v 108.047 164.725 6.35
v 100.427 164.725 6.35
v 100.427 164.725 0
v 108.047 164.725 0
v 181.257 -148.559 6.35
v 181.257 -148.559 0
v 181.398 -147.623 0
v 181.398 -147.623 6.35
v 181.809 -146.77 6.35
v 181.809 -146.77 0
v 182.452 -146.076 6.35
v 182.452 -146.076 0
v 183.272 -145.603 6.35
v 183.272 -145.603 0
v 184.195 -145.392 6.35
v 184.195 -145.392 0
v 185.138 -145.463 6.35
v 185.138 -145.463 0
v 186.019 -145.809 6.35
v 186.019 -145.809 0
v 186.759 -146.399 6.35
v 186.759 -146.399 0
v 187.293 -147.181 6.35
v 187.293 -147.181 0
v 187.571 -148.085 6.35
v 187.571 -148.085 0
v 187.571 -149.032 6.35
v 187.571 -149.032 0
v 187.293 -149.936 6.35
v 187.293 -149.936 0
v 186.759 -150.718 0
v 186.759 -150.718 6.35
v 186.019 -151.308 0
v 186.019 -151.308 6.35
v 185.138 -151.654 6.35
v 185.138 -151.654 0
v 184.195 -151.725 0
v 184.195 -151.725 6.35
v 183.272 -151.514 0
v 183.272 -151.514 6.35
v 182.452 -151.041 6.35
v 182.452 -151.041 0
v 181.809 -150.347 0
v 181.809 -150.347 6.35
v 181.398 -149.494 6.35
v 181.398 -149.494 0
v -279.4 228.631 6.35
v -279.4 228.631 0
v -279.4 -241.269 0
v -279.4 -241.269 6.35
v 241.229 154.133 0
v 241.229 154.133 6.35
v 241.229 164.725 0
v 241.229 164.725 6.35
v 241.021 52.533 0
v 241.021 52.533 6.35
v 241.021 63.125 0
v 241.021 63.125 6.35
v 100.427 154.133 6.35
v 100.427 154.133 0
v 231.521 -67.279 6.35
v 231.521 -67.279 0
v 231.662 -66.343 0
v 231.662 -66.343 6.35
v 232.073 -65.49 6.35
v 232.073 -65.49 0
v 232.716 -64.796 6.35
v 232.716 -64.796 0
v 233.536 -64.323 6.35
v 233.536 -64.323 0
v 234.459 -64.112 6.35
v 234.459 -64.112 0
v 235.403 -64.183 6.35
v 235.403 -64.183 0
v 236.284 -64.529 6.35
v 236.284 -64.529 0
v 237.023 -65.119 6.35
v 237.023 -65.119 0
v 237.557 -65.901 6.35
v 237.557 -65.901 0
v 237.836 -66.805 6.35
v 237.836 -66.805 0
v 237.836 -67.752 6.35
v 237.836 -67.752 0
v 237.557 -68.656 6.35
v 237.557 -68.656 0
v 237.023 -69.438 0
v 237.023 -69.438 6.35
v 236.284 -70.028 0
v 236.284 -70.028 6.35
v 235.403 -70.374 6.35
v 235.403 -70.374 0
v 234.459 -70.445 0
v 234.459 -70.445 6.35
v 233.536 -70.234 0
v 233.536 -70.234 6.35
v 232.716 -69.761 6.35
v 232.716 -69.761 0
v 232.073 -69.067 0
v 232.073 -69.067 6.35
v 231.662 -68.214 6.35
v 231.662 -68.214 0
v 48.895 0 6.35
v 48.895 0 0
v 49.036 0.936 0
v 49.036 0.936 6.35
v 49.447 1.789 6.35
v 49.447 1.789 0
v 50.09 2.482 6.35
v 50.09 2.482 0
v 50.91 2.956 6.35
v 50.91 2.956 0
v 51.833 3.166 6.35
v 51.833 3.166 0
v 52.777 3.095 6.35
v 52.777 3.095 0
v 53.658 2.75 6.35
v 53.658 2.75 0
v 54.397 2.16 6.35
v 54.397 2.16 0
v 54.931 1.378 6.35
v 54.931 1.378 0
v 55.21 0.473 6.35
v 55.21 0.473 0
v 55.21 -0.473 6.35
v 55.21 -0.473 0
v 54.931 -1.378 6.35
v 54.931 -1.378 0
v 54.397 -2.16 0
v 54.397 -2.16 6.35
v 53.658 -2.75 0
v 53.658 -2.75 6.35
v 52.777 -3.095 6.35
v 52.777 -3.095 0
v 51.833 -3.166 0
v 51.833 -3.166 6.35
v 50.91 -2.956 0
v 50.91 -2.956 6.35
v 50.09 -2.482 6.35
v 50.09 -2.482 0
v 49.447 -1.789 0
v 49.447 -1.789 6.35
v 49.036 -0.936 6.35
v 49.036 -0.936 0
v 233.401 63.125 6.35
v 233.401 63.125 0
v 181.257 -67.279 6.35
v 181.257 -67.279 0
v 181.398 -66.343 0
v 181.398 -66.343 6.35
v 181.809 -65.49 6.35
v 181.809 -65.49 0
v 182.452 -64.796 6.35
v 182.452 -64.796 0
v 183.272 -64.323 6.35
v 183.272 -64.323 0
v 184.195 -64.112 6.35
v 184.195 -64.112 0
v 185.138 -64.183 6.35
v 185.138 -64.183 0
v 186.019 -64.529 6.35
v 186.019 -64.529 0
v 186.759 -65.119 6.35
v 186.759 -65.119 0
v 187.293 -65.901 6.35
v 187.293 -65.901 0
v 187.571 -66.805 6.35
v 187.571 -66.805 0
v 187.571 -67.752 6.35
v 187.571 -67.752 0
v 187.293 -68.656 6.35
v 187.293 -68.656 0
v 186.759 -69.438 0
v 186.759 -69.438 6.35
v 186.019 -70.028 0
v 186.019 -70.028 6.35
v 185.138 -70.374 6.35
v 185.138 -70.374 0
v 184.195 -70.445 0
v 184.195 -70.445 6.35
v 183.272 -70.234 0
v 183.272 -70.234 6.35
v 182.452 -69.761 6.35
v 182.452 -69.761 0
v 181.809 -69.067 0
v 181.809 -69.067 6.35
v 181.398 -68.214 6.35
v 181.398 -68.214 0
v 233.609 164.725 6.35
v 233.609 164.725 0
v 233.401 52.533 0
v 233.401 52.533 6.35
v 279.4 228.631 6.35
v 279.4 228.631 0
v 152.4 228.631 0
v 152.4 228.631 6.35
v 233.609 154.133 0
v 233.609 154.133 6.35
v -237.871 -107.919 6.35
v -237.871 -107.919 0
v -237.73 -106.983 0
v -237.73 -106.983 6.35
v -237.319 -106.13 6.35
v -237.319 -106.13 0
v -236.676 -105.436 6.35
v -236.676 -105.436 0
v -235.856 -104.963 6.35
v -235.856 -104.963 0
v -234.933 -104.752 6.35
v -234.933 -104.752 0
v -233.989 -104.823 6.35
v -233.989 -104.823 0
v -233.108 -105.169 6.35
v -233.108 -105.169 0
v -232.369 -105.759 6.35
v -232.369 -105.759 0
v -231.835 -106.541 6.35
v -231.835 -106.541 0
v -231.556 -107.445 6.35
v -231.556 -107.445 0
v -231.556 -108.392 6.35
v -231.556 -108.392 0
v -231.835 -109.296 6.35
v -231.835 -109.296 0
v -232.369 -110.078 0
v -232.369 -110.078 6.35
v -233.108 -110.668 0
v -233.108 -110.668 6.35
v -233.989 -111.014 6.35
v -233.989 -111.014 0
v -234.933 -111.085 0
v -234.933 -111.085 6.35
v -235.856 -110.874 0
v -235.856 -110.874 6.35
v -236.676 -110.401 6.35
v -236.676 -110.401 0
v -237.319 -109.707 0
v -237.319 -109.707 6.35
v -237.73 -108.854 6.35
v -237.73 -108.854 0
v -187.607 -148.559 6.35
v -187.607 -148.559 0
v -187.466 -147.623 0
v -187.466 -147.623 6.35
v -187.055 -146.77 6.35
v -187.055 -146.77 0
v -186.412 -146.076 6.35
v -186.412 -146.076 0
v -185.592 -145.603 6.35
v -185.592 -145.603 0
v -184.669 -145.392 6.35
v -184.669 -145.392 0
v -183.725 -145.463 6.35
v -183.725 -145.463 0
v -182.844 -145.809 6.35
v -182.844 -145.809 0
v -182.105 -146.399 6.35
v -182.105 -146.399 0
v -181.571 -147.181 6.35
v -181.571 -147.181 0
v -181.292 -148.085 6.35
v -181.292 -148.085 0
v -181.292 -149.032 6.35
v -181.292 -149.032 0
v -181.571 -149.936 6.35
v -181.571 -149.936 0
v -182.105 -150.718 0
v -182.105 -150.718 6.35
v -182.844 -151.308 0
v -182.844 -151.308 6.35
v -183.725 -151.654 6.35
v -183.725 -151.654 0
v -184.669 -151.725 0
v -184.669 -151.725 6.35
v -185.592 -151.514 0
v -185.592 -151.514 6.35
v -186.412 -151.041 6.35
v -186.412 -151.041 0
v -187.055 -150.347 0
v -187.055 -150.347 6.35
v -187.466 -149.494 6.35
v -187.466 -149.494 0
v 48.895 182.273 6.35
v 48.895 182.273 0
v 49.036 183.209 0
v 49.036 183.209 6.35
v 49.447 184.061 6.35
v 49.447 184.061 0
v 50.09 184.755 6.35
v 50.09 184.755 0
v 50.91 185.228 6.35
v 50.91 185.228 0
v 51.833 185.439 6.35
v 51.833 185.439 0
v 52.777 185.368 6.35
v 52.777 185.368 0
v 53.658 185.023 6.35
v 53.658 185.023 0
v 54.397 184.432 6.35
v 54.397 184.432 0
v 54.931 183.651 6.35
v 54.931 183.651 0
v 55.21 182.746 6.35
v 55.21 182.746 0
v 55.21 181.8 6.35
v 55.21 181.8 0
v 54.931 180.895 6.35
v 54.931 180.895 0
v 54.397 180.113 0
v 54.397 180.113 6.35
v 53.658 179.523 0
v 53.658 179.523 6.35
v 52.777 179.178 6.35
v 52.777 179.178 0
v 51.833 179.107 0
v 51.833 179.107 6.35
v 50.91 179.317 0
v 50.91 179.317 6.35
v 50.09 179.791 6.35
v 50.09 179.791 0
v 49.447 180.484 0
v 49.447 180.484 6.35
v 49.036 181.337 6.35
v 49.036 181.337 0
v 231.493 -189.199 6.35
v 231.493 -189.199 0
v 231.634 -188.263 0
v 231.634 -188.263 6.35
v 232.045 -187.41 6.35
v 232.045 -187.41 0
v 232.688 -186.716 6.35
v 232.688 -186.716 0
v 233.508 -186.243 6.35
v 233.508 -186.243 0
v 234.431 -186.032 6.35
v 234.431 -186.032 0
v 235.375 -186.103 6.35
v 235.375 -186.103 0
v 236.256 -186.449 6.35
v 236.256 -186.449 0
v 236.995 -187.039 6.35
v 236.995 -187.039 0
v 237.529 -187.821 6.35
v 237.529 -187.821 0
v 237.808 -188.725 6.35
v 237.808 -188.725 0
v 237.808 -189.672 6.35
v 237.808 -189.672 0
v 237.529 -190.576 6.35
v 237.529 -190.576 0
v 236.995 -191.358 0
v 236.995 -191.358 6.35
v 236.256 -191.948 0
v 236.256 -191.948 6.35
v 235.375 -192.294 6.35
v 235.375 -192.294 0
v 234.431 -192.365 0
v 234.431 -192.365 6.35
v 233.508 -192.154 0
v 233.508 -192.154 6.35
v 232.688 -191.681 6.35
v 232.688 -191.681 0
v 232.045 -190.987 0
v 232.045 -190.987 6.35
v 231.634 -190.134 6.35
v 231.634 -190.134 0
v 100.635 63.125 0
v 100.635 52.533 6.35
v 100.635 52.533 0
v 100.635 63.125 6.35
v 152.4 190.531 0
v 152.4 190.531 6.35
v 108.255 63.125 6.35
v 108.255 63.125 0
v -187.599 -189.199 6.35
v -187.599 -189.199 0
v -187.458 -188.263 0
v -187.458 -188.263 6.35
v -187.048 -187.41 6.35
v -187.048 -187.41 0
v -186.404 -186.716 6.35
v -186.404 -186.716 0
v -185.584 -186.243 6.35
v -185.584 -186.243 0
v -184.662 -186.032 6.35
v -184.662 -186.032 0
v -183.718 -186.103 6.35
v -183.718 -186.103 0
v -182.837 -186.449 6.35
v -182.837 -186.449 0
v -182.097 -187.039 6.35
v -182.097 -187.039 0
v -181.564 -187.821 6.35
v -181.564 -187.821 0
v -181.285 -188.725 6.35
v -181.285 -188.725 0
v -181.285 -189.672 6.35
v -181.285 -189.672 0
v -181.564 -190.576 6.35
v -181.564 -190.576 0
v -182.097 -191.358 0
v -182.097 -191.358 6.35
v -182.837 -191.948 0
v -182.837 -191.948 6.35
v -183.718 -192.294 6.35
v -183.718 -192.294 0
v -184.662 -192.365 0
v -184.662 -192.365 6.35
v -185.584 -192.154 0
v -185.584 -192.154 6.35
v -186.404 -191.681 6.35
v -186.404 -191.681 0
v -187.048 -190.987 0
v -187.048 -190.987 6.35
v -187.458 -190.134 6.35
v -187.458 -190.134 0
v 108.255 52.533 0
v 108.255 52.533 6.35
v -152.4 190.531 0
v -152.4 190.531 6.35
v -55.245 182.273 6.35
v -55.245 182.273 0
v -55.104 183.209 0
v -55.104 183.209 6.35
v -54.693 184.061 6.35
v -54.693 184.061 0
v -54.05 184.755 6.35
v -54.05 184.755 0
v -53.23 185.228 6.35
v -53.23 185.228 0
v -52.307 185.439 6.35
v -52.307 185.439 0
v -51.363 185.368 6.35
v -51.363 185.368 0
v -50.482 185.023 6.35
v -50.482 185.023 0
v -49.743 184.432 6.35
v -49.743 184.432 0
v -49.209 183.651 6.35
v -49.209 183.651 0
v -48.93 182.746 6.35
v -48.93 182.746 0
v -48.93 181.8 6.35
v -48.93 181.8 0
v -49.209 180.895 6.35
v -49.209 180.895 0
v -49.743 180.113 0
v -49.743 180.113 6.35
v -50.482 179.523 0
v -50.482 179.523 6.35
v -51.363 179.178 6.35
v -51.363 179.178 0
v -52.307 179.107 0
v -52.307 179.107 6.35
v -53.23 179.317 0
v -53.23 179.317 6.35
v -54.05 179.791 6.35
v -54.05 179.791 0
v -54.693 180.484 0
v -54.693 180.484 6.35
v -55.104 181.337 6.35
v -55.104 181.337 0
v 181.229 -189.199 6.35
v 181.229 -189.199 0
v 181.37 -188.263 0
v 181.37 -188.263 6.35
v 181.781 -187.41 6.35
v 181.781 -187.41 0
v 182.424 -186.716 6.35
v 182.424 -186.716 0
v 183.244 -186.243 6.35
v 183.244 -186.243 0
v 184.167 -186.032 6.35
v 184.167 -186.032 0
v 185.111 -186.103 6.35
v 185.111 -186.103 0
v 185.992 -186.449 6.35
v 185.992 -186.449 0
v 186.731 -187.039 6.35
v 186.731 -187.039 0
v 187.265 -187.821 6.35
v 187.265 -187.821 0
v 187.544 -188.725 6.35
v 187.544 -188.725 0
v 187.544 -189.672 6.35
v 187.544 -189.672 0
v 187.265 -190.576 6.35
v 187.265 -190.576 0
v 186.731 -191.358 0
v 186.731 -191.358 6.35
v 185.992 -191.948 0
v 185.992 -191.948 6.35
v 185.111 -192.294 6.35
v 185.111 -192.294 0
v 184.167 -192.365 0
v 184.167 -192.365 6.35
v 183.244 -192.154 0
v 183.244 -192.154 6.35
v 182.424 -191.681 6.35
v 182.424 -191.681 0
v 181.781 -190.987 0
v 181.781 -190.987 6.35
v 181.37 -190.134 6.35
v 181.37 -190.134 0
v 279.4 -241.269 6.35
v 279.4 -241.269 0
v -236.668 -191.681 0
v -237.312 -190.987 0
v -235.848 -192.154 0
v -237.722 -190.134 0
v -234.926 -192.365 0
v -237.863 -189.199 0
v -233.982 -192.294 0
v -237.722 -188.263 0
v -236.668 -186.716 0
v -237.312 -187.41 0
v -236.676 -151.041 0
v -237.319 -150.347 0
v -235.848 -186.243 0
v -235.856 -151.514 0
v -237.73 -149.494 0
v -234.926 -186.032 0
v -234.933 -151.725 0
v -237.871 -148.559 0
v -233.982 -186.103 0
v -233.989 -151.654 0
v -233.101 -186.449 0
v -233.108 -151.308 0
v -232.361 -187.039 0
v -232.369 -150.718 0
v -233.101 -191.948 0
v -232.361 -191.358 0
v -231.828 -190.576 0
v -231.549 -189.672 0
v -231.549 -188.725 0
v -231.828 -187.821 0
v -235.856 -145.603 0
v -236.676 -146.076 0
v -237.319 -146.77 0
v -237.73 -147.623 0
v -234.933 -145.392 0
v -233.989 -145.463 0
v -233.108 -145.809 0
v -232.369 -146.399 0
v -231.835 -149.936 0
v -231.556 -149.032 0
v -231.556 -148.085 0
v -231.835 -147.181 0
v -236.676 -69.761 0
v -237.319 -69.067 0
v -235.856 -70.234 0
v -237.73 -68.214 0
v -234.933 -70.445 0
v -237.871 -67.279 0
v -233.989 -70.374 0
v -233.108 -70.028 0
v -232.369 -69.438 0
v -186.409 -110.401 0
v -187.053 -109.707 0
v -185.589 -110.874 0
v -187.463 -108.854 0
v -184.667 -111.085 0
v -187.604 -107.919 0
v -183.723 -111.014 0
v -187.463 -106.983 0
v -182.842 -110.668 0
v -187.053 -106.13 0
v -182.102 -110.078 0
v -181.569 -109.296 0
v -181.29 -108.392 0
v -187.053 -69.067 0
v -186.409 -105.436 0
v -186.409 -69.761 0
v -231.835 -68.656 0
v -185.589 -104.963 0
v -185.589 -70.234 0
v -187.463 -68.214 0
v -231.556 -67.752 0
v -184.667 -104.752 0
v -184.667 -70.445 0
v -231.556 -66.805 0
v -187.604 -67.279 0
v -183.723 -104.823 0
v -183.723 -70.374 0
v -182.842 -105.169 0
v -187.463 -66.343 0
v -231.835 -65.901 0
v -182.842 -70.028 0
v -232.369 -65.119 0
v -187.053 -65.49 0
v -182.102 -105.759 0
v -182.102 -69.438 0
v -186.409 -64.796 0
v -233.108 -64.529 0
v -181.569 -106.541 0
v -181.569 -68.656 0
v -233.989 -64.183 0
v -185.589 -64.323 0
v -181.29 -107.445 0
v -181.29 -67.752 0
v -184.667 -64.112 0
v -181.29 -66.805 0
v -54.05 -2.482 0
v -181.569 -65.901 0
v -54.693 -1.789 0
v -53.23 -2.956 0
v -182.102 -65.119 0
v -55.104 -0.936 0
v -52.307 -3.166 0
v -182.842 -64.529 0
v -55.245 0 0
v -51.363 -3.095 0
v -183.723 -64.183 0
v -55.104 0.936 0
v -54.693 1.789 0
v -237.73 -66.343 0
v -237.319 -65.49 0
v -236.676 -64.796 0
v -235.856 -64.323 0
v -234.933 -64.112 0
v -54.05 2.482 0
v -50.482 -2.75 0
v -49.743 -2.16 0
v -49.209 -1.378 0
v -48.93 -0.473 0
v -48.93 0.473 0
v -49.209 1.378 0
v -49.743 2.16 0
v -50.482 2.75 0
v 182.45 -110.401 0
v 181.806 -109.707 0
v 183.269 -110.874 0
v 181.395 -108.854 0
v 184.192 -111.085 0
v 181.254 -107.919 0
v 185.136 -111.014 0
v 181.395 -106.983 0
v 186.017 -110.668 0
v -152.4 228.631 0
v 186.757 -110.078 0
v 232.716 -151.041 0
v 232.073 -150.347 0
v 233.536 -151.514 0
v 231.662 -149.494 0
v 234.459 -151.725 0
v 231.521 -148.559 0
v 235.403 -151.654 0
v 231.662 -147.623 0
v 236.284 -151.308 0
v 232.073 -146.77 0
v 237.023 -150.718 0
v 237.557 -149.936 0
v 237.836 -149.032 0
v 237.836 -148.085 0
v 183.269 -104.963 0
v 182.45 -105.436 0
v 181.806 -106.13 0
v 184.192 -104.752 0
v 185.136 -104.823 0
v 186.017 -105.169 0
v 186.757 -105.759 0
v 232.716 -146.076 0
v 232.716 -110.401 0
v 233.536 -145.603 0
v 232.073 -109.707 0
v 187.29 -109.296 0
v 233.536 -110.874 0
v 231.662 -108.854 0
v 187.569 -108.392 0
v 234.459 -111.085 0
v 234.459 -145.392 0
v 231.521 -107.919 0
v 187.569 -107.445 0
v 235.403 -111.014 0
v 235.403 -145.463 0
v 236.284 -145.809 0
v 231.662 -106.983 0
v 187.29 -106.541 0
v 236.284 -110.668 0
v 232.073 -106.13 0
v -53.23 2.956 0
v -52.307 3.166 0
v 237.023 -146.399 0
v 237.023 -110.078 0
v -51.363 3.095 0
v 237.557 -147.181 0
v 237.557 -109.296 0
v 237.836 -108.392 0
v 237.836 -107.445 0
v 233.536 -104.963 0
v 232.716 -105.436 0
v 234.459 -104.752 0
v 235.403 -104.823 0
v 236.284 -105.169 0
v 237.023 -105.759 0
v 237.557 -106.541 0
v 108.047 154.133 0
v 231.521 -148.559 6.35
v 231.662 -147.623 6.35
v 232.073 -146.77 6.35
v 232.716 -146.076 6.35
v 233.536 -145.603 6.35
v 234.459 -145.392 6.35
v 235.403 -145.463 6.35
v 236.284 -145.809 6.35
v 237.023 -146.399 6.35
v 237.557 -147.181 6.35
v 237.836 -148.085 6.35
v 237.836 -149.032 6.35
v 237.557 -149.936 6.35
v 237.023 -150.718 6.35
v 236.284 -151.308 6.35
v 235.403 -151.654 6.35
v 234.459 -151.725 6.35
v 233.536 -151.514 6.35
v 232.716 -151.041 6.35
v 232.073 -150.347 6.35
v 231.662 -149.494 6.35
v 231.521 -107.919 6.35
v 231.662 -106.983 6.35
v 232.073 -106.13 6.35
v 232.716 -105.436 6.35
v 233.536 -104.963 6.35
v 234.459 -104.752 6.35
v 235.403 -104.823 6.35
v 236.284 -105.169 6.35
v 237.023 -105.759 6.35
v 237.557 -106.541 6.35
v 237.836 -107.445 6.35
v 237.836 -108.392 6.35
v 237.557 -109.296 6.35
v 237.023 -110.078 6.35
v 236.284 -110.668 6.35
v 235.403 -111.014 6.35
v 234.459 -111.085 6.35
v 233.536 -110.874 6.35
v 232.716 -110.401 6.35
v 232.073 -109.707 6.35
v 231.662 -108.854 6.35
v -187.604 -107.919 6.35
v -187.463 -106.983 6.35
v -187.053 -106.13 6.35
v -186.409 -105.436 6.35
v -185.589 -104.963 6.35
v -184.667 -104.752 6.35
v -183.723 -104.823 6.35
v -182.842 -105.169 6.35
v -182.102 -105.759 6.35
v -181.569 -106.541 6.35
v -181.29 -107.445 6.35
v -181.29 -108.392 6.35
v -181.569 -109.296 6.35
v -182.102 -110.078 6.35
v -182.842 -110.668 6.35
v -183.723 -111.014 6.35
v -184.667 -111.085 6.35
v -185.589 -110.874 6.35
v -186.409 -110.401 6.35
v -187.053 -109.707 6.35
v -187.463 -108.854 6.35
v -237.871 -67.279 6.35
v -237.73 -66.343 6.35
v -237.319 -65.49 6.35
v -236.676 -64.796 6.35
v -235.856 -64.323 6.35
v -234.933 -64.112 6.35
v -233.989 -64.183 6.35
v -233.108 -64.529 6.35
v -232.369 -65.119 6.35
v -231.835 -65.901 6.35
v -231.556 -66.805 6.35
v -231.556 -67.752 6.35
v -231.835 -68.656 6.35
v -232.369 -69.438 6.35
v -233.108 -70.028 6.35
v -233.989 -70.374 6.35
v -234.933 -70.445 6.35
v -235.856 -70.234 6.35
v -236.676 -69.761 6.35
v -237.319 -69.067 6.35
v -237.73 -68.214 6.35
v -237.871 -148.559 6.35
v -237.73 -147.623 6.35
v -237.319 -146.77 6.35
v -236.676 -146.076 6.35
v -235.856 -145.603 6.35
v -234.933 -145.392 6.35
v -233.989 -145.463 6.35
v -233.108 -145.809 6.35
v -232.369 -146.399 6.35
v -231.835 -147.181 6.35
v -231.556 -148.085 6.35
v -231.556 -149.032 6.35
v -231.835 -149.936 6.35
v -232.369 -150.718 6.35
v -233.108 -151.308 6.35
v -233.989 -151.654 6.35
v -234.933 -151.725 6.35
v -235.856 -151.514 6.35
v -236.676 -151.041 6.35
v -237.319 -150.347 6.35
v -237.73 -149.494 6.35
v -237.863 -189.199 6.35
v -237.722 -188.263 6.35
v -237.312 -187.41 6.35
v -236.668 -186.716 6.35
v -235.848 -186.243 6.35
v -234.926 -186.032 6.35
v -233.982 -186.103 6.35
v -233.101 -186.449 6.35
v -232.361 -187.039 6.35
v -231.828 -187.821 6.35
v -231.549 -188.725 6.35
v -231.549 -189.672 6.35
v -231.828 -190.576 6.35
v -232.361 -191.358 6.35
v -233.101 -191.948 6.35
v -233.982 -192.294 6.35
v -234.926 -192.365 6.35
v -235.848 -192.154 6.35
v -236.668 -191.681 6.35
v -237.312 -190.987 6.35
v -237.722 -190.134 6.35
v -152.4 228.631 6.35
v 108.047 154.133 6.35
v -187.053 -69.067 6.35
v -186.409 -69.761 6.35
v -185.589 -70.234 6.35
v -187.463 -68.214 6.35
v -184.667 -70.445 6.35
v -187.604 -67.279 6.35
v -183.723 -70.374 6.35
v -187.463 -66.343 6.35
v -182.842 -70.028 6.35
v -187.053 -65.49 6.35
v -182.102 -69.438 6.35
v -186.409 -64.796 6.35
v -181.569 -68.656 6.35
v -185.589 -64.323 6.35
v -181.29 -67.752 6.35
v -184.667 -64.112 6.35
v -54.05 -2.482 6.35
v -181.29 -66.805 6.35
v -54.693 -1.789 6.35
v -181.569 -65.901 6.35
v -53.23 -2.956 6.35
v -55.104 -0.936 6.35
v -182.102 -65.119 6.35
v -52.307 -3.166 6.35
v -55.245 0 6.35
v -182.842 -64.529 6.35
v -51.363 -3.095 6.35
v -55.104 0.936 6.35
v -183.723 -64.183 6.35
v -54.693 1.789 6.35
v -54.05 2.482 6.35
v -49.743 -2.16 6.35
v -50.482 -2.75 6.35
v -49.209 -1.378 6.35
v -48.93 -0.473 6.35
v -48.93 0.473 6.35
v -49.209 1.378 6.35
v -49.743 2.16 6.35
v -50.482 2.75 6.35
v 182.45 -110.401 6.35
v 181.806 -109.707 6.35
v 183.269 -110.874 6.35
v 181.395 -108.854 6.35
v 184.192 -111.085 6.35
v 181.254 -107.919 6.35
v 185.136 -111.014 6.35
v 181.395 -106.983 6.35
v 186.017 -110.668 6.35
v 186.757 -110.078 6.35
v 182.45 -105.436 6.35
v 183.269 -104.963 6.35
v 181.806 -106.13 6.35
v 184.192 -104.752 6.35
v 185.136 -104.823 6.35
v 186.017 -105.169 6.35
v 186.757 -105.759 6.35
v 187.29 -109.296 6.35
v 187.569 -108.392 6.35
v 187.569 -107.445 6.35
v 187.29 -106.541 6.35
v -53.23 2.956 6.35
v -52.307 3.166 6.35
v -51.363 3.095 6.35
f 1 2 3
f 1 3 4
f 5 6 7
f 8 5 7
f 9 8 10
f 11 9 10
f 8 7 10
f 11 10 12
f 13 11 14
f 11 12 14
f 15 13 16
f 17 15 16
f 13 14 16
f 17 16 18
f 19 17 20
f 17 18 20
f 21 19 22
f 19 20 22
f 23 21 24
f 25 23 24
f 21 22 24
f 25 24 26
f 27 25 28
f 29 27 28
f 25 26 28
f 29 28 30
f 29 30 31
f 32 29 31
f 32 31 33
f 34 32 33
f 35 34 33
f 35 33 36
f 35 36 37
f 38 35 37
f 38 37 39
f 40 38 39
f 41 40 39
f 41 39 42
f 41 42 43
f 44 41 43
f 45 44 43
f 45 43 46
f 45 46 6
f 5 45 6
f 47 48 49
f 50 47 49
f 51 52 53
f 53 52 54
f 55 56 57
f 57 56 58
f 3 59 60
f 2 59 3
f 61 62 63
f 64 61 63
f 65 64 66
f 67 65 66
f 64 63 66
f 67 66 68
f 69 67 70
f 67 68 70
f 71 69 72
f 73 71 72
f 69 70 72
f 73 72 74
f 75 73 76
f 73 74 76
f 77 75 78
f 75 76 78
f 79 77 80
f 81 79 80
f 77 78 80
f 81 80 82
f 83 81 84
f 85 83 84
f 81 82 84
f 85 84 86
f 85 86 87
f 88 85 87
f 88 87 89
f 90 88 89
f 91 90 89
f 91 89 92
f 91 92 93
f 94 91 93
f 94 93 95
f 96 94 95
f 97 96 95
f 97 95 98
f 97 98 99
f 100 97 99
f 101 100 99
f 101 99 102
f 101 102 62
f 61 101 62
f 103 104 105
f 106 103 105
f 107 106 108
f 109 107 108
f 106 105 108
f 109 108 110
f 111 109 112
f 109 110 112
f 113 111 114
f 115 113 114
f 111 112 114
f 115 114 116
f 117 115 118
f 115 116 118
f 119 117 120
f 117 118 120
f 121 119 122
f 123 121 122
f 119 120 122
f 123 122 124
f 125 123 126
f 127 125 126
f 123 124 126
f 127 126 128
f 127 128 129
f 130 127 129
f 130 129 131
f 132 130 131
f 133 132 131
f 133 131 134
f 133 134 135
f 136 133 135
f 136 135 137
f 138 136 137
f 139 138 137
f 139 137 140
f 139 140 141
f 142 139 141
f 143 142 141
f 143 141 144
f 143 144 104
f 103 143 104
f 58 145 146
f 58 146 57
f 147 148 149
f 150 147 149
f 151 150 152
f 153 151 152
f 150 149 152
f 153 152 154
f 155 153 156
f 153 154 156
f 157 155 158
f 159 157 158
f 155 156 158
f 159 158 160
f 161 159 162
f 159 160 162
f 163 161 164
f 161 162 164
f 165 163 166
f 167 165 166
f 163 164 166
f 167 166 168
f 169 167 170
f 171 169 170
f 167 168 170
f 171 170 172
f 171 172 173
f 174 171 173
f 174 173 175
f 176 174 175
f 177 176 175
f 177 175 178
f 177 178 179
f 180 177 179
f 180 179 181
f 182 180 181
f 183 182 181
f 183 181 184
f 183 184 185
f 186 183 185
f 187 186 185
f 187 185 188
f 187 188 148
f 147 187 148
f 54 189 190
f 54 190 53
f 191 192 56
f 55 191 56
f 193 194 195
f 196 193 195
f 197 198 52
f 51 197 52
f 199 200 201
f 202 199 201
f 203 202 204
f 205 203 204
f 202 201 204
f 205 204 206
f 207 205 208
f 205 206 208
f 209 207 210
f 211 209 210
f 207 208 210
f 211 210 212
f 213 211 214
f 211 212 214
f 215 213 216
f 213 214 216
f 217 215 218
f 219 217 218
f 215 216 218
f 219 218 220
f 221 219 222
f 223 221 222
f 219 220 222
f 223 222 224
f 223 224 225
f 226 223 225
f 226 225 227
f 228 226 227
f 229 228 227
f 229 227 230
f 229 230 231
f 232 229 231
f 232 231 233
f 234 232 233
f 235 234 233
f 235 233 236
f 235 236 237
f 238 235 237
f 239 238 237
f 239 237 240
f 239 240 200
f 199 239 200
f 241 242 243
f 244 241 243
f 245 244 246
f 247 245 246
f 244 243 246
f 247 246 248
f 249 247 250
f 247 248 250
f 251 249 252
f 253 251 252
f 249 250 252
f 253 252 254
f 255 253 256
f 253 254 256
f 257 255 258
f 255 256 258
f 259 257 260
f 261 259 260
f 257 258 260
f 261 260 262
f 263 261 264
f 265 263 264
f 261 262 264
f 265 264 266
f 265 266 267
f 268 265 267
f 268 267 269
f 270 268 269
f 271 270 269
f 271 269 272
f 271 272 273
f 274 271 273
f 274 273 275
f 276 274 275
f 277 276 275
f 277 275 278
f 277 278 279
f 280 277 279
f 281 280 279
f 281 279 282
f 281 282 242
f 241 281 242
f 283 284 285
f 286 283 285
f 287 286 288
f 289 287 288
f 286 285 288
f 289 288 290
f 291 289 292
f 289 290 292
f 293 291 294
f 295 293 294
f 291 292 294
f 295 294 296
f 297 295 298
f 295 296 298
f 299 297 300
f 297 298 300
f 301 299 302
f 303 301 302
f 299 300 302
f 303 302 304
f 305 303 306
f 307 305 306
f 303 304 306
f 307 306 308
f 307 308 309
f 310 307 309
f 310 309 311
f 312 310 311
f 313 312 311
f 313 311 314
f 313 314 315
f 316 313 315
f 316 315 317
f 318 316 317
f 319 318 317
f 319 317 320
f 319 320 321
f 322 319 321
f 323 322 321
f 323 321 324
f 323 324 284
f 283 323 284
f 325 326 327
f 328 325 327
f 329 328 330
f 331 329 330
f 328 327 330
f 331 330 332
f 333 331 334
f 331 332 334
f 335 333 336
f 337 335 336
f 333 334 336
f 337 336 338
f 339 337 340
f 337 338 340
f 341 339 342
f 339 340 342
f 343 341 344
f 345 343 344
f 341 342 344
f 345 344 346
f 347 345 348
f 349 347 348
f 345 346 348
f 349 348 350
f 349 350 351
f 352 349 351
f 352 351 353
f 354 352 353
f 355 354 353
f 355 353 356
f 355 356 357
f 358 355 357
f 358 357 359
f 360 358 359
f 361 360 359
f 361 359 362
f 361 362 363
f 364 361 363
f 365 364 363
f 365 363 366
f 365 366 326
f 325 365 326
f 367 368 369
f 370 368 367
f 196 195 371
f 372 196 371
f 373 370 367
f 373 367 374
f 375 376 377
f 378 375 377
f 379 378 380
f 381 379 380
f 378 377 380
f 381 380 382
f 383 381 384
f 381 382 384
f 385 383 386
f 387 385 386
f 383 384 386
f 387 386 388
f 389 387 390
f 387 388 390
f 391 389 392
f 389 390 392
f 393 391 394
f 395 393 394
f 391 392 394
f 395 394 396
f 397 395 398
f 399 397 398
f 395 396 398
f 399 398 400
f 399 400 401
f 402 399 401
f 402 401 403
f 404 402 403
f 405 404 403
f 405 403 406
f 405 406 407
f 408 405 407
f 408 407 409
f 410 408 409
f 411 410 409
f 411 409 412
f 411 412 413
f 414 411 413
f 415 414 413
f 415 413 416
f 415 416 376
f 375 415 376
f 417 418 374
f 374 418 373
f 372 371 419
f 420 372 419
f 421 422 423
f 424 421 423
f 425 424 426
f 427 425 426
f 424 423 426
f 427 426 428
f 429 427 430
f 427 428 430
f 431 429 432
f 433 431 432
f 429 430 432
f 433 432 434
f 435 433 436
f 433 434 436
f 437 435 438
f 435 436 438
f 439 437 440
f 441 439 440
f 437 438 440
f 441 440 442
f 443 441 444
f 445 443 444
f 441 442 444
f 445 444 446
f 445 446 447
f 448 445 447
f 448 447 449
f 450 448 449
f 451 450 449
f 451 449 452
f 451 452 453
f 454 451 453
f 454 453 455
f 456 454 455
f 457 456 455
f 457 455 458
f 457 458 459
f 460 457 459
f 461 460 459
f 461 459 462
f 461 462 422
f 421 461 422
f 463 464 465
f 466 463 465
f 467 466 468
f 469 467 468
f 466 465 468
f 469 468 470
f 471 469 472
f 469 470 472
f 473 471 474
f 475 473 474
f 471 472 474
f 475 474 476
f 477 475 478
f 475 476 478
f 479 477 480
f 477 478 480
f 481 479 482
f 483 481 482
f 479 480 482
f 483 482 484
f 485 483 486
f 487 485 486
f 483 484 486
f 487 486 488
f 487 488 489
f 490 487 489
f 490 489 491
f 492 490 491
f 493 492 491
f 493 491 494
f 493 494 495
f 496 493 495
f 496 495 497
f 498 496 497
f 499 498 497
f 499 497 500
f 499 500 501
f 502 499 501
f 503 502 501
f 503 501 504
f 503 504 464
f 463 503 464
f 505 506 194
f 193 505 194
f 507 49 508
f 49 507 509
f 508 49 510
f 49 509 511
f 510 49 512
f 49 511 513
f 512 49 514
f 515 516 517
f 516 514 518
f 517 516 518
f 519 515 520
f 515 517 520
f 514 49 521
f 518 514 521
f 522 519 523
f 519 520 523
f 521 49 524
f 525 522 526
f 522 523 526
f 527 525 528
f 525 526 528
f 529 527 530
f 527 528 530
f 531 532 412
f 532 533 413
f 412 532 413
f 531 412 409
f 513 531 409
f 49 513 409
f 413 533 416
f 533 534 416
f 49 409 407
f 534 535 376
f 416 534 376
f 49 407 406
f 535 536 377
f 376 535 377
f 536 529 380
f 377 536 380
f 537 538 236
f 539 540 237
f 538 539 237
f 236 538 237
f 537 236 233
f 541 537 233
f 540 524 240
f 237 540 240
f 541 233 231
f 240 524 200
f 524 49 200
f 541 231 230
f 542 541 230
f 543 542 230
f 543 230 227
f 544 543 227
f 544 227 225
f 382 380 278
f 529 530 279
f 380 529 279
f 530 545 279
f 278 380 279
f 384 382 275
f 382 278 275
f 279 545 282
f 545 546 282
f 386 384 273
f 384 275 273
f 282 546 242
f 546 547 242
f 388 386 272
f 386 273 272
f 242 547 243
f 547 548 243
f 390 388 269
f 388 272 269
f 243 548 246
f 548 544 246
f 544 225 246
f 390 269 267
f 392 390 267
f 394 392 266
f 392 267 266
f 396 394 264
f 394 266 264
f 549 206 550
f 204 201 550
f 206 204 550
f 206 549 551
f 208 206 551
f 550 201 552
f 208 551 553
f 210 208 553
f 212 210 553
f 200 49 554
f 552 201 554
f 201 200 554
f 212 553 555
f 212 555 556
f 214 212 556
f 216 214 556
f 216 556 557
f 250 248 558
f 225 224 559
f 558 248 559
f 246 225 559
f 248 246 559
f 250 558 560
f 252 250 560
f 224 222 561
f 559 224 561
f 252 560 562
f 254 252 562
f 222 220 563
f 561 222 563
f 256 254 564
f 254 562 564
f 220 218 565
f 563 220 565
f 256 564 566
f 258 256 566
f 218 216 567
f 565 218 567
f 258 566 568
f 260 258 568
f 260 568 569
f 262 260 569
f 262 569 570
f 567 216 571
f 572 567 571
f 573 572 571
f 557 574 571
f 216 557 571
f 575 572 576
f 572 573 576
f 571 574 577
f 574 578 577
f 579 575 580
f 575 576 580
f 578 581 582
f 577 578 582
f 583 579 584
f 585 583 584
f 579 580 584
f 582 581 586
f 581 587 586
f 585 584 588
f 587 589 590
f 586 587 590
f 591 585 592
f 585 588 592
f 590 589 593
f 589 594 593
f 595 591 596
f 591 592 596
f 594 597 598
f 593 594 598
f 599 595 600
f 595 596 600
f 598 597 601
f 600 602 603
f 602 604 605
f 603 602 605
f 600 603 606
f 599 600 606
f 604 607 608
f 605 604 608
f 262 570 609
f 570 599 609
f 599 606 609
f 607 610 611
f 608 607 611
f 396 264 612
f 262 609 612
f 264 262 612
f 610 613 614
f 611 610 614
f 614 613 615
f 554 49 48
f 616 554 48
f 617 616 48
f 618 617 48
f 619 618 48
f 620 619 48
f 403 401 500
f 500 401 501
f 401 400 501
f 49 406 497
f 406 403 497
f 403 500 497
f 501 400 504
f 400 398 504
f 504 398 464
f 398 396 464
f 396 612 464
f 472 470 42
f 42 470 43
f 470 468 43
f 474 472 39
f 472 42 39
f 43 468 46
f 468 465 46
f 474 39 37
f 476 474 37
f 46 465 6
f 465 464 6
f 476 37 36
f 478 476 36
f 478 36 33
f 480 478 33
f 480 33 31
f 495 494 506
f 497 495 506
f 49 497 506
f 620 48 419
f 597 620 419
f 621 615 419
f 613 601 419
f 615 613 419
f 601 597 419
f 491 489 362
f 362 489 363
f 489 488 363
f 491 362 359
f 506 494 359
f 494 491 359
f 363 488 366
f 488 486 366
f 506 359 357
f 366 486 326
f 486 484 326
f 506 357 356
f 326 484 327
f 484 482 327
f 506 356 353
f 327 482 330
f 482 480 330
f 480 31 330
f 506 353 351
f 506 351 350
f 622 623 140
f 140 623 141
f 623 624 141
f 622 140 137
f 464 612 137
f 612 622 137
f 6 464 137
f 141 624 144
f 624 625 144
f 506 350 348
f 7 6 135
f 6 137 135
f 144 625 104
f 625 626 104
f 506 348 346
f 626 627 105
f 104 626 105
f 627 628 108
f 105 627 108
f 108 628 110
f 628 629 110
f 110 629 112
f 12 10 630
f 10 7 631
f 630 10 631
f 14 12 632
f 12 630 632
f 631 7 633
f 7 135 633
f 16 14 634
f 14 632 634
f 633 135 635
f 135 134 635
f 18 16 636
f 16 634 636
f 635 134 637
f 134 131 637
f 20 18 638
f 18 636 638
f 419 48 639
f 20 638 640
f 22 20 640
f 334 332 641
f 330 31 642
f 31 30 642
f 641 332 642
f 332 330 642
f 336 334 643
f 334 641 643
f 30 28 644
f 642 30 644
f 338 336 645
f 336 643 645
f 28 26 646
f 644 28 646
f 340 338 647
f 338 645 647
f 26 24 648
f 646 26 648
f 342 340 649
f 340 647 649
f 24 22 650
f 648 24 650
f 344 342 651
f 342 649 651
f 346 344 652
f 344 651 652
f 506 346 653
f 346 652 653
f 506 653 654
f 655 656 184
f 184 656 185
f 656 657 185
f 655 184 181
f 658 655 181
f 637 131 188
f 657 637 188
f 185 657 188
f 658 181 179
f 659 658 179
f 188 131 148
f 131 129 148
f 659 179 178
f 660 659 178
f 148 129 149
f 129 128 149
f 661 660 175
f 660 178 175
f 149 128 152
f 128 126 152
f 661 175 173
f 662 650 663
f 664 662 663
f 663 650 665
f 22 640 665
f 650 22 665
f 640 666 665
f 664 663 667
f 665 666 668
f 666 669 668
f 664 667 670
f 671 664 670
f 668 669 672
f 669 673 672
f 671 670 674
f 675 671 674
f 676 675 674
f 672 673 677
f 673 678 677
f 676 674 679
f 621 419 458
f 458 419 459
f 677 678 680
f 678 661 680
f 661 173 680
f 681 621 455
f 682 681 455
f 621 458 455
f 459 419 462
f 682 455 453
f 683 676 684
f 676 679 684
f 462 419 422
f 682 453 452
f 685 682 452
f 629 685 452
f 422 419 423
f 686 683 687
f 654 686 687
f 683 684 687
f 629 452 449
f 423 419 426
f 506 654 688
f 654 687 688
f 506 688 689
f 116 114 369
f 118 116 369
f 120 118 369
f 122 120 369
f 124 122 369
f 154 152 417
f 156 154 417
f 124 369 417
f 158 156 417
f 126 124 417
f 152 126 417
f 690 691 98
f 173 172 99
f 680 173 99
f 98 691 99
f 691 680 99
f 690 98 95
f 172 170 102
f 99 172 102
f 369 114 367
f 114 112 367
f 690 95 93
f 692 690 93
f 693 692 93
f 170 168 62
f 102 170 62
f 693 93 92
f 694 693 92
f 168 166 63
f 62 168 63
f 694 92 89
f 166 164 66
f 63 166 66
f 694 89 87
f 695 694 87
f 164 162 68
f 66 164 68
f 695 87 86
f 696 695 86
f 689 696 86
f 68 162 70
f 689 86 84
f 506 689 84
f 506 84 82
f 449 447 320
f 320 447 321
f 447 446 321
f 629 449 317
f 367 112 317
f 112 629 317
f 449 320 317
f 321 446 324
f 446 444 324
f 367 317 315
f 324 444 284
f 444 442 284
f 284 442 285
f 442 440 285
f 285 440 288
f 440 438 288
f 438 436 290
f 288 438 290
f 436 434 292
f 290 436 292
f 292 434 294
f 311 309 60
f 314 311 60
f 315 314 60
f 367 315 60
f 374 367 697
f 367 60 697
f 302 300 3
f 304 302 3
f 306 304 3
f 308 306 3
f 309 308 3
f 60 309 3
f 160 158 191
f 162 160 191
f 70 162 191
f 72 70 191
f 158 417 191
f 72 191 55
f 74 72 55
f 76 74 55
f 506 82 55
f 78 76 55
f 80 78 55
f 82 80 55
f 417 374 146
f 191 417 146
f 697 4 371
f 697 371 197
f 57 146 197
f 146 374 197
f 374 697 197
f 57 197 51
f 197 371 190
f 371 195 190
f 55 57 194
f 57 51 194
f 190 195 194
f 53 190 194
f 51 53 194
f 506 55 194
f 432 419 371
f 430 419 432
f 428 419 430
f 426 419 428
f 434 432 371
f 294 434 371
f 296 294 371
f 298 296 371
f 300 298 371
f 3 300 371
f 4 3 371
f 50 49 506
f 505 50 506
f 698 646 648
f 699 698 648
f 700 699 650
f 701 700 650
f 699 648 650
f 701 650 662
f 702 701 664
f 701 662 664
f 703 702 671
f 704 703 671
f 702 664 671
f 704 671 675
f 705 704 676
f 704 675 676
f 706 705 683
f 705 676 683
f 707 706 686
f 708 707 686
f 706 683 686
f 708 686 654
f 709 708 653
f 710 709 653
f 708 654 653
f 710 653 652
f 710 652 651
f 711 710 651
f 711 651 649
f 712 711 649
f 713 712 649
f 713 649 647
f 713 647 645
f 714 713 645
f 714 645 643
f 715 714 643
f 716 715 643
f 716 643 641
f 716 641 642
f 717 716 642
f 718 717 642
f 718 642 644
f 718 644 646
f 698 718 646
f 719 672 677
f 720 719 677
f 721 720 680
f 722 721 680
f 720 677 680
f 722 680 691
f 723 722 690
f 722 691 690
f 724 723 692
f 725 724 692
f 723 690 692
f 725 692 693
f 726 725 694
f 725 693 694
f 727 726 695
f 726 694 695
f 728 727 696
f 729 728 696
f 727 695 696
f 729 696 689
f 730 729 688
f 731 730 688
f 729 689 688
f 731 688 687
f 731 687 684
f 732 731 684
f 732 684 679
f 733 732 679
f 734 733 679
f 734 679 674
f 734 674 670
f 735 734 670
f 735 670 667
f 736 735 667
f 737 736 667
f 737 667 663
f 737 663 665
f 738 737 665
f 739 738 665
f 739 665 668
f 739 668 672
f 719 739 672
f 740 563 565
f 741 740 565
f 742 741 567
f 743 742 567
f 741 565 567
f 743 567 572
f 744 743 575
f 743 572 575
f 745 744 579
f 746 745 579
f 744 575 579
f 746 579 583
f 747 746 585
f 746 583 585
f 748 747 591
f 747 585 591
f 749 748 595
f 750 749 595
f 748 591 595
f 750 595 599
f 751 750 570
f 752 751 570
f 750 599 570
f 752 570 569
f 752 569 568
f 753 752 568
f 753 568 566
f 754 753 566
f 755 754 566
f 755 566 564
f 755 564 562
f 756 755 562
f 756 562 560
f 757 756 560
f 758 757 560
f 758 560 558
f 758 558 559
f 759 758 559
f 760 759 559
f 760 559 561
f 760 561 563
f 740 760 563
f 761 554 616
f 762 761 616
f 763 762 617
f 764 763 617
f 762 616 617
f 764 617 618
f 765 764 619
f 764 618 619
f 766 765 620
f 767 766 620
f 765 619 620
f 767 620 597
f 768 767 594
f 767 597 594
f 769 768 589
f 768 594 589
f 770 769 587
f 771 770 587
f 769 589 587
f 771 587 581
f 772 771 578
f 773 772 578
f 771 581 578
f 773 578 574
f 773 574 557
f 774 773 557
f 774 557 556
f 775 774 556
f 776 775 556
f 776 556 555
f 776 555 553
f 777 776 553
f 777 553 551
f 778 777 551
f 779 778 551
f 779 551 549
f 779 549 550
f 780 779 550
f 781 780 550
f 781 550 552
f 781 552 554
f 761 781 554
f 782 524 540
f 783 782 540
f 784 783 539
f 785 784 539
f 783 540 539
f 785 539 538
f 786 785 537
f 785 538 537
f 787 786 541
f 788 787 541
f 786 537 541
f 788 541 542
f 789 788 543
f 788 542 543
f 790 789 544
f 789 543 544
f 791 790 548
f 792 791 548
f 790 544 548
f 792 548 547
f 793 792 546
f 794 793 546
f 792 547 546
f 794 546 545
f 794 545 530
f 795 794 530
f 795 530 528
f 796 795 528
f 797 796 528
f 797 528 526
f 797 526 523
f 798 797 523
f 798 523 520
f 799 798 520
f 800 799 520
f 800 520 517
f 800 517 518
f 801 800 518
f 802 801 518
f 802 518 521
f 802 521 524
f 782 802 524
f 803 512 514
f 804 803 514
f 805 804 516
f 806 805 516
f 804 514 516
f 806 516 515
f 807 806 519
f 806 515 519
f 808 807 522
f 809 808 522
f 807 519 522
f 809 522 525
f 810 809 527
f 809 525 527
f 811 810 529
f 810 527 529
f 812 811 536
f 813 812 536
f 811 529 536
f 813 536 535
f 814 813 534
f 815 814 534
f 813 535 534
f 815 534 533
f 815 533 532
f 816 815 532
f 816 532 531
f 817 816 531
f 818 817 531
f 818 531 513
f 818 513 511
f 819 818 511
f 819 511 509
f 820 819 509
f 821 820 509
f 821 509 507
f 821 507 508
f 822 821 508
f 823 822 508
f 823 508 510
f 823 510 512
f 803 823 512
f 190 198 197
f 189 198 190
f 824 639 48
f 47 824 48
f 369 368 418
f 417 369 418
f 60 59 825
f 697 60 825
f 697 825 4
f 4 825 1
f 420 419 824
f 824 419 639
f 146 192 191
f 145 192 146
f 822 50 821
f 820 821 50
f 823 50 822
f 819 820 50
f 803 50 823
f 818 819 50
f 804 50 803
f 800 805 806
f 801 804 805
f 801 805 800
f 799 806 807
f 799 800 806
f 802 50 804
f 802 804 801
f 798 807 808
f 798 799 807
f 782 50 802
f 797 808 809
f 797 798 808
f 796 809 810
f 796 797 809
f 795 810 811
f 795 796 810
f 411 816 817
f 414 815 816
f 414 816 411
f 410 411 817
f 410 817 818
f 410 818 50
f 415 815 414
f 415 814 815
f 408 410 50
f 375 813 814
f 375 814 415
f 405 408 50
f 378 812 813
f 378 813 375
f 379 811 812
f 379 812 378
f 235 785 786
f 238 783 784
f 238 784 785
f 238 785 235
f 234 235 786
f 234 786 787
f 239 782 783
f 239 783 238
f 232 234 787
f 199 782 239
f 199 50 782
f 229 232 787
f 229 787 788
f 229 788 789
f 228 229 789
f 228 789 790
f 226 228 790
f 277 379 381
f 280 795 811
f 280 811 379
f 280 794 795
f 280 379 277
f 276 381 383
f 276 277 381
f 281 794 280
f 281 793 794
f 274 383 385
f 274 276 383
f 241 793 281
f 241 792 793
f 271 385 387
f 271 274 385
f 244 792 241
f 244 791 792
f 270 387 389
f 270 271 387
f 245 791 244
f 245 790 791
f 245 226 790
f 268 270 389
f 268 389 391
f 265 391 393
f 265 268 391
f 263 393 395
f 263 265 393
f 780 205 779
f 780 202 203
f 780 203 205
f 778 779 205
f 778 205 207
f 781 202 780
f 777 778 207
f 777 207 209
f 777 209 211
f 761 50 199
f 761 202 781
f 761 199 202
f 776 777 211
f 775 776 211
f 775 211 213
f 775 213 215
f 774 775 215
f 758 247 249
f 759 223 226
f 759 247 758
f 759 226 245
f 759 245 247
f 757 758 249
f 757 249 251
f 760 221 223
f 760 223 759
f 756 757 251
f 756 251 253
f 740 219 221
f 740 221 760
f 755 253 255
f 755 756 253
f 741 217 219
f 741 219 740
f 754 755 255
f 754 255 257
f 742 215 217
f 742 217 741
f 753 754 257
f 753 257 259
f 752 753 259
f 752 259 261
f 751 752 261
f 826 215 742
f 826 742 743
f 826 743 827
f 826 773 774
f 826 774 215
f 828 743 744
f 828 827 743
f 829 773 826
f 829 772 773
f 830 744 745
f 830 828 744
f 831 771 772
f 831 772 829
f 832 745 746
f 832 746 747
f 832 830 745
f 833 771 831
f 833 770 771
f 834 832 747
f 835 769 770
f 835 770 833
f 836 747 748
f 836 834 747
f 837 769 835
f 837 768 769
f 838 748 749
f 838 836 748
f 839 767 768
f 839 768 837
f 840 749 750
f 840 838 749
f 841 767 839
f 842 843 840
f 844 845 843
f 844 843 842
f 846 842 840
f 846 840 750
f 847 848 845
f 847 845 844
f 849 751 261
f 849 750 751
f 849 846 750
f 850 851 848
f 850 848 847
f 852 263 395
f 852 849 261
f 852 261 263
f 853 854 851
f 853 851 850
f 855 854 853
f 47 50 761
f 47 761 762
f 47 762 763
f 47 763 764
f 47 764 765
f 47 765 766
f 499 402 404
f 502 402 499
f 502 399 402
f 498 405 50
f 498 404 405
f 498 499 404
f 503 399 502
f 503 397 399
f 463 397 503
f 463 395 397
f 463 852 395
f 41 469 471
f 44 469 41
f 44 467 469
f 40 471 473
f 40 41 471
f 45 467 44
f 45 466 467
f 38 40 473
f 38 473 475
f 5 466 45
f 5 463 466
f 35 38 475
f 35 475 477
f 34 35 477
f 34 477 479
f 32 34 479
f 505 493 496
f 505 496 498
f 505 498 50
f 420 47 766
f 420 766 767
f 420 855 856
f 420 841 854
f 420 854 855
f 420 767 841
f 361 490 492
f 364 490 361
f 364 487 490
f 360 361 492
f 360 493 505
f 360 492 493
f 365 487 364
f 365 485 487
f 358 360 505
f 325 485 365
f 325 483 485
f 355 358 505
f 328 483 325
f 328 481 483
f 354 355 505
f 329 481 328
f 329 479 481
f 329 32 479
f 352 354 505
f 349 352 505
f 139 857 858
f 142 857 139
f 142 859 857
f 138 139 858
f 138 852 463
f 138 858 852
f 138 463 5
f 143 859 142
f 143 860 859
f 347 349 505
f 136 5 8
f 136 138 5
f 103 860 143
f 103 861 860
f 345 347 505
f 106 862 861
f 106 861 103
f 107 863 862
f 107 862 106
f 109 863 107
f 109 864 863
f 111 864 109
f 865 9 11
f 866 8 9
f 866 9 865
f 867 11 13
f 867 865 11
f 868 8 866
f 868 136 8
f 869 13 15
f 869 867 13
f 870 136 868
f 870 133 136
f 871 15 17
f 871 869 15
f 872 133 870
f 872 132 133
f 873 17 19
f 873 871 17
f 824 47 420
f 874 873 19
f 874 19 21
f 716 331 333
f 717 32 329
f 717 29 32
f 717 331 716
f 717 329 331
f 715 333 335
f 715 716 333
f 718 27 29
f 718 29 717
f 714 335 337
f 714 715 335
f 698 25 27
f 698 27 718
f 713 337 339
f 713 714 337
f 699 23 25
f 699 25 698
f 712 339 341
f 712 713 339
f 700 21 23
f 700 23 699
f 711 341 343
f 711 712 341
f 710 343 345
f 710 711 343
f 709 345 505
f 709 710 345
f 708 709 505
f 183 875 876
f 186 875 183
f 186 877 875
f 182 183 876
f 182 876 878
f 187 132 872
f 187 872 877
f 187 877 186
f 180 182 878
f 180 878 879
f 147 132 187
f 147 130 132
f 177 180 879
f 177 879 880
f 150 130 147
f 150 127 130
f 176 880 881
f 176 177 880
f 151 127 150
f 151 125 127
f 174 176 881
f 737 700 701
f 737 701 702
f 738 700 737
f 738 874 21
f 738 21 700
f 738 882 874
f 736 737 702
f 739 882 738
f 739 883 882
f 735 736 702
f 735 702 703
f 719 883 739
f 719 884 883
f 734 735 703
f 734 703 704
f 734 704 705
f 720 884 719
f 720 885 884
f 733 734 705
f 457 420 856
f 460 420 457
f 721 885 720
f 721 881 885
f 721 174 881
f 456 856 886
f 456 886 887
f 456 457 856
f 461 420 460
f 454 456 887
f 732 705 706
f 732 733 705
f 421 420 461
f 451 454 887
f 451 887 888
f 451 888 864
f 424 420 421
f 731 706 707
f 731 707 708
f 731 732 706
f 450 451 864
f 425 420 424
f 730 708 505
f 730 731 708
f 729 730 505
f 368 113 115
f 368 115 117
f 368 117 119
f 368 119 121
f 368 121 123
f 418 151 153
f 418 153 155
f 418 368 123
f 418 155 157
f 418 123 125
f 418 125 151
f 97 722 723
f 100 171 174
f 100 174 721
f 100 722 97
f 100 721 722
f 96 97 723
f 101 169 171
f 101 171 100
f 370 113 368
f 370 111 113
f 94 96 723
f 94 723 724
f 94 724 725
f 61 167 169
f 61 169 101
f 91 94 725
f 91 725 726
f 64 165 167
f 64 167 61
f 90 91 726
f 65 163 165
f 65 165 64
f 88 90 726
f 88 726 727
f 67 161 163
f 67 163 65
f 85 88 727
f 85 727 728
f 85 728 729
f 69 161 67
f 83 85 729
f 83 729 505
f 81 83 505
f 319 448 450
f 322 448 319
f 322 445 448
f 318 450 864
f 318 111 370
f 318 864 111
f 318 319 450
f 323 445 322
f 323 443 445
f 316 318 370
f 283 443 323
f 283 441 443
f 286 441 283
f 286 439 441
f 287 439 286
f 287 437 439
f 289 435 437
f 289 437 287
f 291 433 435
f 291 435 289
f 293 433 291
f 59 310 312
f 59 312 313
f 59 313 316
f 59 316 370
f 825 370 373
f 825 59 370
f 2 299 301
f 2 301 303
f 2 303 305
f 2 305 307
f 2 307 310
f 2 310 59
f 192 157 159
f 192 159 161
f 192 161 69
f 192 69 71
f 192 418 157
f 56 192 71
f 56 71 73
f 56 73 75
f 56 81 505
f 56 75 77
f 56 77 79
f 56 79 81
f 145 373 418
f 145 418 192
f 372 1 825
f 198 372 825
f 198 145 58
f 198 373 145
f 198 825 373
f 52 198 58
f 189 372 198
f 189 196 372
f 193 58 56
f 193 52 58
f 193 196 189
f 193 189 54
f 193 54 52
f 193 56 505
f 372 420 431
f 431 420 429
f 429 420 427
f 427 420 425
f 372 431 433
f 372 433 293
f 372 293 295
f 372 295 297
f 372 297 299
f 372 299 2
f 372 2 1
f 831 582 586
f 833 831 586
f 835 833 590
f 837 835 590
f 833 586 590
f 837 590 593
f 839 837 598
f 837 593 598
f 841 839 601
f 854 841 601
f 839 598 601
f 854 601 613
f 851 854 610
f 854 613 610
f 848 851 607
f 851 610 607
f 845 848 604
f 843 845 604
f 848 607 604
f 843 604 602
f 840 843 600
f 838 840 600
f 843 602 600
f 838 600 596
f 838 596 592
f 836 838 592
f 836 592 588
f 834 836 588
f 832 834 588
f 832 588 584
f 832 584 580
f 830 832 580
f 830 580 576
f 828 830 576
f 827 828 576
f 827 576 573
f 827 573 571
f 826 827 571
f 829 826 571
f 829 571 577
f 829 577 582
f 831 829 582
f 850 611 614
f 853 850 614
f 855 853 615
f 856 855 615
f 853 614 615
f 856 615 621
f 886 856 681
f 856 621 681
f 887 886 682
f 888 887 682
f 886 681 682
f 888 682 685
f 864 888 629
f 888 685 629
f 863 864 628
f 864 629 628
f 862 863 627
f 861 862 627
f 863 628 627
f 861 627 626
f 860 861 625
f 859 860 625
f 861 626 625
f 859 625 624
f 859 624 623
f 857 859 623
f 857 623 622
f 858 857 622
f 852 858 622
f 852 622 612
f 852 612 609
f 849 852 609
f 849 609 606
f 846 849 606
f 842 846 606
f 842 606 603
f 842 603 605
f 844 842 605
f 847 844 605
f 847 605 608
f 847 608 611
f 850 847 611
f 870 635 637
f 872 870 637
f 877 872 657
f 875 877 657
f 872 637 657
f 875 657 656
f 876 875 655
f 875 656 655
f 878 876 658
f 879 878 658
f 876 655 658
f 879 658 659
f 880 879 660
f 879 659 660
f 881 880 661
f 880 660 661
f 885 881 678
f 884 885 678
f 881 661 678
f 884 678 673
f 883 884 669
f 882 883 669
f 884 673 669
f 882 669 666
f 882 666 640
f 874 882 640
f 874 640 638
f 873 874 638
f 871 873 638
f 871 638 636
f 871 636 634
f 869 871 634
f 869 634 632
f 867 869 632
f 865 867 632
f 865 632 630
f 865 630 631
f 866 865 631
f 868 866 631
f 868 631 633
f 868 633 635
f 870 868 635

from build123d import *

# Parameters (mm, degrees)
F1_DEPTH  = 6.35
F3_D      = 6.35
F5_D      = 6.35
F8_D      = 6.35
F10_D     = 6.35
F11_W     = 7.62
F11_H     = 10.5918
F12_DEPTH = 25.4


with BuildPart() as f1:
    # F0 (on Top) → F1 (new body)
    with BuildSketch(Plane.XY):
        Polygon((-279.4, 228.631461), (-279.4, -241.268539), (279.4, -241.268539), (279.4, 228.631461), (152.4, 228.631461), (152.4, 190.531461), (-152.4, 190.531461), (-152.4, 228.631461), align=None)
    extrude(amount=F1_DEPTH)

    # F3 (through all)
    with Locations(Plane.XY.offset(6.35)):
        with Locations((-234.68838, -189.198539), (-184.42432, -189.198539)):
            Hole(F3_D / 2)

    # F5 (through all)
    with Locations(Plane.XY.offset(6.35)):
        with Locations((-234.696, -67.278539), (-184.4294, -67.278539), (-184.4294, -107.918539), (-234.696, -107.918539), (-234.696, -148.558539), (-184.43194, -148.558539)):
            Hole(F5_D / 2)

    # F8 (through all)
    with Locations(Plane.XY.offset(6.35)):
        with Locations((184.404, -189.198539), (234.66806, -189.198539), (234.696, -148.558539), (184.43194, -148.558539), (184.4294, -107.918539), (234.696, -107.918539), (234.696, -67.278539), (184.43194, -67.278539)):
            Hole(F8_D / 2)

    # F10 (through all)
    with Locations(Plane.XY.offset(6.35)):
        with Locations((-52.07, 182.27294), (52.07, 182.27294), (52.07, 0), (-52.07, 0)):
            Hole(F10_D / 2)

    # F11 (on face) → F12 (cut)
    with BuildSketch(Plane.XY.offset(6.35)):
        with Locations((104.4448, 57.829161)):
            Rectangle(F11_W, F11_H)
        with Locations((104.23652, 159.429161)):
            Rectangle(F11_W, F11_H)
        with Locations((237.41888, 159.429161)):
            Rectangle(F11_W, F11_H)
        with Locations((237.2106, 57.829161)):
            Rectangle(F11_W, F11_H)
    extrude(amount=-F12_DEPTH, mode=Mode.SUBTRACT)


solid = f1.part
